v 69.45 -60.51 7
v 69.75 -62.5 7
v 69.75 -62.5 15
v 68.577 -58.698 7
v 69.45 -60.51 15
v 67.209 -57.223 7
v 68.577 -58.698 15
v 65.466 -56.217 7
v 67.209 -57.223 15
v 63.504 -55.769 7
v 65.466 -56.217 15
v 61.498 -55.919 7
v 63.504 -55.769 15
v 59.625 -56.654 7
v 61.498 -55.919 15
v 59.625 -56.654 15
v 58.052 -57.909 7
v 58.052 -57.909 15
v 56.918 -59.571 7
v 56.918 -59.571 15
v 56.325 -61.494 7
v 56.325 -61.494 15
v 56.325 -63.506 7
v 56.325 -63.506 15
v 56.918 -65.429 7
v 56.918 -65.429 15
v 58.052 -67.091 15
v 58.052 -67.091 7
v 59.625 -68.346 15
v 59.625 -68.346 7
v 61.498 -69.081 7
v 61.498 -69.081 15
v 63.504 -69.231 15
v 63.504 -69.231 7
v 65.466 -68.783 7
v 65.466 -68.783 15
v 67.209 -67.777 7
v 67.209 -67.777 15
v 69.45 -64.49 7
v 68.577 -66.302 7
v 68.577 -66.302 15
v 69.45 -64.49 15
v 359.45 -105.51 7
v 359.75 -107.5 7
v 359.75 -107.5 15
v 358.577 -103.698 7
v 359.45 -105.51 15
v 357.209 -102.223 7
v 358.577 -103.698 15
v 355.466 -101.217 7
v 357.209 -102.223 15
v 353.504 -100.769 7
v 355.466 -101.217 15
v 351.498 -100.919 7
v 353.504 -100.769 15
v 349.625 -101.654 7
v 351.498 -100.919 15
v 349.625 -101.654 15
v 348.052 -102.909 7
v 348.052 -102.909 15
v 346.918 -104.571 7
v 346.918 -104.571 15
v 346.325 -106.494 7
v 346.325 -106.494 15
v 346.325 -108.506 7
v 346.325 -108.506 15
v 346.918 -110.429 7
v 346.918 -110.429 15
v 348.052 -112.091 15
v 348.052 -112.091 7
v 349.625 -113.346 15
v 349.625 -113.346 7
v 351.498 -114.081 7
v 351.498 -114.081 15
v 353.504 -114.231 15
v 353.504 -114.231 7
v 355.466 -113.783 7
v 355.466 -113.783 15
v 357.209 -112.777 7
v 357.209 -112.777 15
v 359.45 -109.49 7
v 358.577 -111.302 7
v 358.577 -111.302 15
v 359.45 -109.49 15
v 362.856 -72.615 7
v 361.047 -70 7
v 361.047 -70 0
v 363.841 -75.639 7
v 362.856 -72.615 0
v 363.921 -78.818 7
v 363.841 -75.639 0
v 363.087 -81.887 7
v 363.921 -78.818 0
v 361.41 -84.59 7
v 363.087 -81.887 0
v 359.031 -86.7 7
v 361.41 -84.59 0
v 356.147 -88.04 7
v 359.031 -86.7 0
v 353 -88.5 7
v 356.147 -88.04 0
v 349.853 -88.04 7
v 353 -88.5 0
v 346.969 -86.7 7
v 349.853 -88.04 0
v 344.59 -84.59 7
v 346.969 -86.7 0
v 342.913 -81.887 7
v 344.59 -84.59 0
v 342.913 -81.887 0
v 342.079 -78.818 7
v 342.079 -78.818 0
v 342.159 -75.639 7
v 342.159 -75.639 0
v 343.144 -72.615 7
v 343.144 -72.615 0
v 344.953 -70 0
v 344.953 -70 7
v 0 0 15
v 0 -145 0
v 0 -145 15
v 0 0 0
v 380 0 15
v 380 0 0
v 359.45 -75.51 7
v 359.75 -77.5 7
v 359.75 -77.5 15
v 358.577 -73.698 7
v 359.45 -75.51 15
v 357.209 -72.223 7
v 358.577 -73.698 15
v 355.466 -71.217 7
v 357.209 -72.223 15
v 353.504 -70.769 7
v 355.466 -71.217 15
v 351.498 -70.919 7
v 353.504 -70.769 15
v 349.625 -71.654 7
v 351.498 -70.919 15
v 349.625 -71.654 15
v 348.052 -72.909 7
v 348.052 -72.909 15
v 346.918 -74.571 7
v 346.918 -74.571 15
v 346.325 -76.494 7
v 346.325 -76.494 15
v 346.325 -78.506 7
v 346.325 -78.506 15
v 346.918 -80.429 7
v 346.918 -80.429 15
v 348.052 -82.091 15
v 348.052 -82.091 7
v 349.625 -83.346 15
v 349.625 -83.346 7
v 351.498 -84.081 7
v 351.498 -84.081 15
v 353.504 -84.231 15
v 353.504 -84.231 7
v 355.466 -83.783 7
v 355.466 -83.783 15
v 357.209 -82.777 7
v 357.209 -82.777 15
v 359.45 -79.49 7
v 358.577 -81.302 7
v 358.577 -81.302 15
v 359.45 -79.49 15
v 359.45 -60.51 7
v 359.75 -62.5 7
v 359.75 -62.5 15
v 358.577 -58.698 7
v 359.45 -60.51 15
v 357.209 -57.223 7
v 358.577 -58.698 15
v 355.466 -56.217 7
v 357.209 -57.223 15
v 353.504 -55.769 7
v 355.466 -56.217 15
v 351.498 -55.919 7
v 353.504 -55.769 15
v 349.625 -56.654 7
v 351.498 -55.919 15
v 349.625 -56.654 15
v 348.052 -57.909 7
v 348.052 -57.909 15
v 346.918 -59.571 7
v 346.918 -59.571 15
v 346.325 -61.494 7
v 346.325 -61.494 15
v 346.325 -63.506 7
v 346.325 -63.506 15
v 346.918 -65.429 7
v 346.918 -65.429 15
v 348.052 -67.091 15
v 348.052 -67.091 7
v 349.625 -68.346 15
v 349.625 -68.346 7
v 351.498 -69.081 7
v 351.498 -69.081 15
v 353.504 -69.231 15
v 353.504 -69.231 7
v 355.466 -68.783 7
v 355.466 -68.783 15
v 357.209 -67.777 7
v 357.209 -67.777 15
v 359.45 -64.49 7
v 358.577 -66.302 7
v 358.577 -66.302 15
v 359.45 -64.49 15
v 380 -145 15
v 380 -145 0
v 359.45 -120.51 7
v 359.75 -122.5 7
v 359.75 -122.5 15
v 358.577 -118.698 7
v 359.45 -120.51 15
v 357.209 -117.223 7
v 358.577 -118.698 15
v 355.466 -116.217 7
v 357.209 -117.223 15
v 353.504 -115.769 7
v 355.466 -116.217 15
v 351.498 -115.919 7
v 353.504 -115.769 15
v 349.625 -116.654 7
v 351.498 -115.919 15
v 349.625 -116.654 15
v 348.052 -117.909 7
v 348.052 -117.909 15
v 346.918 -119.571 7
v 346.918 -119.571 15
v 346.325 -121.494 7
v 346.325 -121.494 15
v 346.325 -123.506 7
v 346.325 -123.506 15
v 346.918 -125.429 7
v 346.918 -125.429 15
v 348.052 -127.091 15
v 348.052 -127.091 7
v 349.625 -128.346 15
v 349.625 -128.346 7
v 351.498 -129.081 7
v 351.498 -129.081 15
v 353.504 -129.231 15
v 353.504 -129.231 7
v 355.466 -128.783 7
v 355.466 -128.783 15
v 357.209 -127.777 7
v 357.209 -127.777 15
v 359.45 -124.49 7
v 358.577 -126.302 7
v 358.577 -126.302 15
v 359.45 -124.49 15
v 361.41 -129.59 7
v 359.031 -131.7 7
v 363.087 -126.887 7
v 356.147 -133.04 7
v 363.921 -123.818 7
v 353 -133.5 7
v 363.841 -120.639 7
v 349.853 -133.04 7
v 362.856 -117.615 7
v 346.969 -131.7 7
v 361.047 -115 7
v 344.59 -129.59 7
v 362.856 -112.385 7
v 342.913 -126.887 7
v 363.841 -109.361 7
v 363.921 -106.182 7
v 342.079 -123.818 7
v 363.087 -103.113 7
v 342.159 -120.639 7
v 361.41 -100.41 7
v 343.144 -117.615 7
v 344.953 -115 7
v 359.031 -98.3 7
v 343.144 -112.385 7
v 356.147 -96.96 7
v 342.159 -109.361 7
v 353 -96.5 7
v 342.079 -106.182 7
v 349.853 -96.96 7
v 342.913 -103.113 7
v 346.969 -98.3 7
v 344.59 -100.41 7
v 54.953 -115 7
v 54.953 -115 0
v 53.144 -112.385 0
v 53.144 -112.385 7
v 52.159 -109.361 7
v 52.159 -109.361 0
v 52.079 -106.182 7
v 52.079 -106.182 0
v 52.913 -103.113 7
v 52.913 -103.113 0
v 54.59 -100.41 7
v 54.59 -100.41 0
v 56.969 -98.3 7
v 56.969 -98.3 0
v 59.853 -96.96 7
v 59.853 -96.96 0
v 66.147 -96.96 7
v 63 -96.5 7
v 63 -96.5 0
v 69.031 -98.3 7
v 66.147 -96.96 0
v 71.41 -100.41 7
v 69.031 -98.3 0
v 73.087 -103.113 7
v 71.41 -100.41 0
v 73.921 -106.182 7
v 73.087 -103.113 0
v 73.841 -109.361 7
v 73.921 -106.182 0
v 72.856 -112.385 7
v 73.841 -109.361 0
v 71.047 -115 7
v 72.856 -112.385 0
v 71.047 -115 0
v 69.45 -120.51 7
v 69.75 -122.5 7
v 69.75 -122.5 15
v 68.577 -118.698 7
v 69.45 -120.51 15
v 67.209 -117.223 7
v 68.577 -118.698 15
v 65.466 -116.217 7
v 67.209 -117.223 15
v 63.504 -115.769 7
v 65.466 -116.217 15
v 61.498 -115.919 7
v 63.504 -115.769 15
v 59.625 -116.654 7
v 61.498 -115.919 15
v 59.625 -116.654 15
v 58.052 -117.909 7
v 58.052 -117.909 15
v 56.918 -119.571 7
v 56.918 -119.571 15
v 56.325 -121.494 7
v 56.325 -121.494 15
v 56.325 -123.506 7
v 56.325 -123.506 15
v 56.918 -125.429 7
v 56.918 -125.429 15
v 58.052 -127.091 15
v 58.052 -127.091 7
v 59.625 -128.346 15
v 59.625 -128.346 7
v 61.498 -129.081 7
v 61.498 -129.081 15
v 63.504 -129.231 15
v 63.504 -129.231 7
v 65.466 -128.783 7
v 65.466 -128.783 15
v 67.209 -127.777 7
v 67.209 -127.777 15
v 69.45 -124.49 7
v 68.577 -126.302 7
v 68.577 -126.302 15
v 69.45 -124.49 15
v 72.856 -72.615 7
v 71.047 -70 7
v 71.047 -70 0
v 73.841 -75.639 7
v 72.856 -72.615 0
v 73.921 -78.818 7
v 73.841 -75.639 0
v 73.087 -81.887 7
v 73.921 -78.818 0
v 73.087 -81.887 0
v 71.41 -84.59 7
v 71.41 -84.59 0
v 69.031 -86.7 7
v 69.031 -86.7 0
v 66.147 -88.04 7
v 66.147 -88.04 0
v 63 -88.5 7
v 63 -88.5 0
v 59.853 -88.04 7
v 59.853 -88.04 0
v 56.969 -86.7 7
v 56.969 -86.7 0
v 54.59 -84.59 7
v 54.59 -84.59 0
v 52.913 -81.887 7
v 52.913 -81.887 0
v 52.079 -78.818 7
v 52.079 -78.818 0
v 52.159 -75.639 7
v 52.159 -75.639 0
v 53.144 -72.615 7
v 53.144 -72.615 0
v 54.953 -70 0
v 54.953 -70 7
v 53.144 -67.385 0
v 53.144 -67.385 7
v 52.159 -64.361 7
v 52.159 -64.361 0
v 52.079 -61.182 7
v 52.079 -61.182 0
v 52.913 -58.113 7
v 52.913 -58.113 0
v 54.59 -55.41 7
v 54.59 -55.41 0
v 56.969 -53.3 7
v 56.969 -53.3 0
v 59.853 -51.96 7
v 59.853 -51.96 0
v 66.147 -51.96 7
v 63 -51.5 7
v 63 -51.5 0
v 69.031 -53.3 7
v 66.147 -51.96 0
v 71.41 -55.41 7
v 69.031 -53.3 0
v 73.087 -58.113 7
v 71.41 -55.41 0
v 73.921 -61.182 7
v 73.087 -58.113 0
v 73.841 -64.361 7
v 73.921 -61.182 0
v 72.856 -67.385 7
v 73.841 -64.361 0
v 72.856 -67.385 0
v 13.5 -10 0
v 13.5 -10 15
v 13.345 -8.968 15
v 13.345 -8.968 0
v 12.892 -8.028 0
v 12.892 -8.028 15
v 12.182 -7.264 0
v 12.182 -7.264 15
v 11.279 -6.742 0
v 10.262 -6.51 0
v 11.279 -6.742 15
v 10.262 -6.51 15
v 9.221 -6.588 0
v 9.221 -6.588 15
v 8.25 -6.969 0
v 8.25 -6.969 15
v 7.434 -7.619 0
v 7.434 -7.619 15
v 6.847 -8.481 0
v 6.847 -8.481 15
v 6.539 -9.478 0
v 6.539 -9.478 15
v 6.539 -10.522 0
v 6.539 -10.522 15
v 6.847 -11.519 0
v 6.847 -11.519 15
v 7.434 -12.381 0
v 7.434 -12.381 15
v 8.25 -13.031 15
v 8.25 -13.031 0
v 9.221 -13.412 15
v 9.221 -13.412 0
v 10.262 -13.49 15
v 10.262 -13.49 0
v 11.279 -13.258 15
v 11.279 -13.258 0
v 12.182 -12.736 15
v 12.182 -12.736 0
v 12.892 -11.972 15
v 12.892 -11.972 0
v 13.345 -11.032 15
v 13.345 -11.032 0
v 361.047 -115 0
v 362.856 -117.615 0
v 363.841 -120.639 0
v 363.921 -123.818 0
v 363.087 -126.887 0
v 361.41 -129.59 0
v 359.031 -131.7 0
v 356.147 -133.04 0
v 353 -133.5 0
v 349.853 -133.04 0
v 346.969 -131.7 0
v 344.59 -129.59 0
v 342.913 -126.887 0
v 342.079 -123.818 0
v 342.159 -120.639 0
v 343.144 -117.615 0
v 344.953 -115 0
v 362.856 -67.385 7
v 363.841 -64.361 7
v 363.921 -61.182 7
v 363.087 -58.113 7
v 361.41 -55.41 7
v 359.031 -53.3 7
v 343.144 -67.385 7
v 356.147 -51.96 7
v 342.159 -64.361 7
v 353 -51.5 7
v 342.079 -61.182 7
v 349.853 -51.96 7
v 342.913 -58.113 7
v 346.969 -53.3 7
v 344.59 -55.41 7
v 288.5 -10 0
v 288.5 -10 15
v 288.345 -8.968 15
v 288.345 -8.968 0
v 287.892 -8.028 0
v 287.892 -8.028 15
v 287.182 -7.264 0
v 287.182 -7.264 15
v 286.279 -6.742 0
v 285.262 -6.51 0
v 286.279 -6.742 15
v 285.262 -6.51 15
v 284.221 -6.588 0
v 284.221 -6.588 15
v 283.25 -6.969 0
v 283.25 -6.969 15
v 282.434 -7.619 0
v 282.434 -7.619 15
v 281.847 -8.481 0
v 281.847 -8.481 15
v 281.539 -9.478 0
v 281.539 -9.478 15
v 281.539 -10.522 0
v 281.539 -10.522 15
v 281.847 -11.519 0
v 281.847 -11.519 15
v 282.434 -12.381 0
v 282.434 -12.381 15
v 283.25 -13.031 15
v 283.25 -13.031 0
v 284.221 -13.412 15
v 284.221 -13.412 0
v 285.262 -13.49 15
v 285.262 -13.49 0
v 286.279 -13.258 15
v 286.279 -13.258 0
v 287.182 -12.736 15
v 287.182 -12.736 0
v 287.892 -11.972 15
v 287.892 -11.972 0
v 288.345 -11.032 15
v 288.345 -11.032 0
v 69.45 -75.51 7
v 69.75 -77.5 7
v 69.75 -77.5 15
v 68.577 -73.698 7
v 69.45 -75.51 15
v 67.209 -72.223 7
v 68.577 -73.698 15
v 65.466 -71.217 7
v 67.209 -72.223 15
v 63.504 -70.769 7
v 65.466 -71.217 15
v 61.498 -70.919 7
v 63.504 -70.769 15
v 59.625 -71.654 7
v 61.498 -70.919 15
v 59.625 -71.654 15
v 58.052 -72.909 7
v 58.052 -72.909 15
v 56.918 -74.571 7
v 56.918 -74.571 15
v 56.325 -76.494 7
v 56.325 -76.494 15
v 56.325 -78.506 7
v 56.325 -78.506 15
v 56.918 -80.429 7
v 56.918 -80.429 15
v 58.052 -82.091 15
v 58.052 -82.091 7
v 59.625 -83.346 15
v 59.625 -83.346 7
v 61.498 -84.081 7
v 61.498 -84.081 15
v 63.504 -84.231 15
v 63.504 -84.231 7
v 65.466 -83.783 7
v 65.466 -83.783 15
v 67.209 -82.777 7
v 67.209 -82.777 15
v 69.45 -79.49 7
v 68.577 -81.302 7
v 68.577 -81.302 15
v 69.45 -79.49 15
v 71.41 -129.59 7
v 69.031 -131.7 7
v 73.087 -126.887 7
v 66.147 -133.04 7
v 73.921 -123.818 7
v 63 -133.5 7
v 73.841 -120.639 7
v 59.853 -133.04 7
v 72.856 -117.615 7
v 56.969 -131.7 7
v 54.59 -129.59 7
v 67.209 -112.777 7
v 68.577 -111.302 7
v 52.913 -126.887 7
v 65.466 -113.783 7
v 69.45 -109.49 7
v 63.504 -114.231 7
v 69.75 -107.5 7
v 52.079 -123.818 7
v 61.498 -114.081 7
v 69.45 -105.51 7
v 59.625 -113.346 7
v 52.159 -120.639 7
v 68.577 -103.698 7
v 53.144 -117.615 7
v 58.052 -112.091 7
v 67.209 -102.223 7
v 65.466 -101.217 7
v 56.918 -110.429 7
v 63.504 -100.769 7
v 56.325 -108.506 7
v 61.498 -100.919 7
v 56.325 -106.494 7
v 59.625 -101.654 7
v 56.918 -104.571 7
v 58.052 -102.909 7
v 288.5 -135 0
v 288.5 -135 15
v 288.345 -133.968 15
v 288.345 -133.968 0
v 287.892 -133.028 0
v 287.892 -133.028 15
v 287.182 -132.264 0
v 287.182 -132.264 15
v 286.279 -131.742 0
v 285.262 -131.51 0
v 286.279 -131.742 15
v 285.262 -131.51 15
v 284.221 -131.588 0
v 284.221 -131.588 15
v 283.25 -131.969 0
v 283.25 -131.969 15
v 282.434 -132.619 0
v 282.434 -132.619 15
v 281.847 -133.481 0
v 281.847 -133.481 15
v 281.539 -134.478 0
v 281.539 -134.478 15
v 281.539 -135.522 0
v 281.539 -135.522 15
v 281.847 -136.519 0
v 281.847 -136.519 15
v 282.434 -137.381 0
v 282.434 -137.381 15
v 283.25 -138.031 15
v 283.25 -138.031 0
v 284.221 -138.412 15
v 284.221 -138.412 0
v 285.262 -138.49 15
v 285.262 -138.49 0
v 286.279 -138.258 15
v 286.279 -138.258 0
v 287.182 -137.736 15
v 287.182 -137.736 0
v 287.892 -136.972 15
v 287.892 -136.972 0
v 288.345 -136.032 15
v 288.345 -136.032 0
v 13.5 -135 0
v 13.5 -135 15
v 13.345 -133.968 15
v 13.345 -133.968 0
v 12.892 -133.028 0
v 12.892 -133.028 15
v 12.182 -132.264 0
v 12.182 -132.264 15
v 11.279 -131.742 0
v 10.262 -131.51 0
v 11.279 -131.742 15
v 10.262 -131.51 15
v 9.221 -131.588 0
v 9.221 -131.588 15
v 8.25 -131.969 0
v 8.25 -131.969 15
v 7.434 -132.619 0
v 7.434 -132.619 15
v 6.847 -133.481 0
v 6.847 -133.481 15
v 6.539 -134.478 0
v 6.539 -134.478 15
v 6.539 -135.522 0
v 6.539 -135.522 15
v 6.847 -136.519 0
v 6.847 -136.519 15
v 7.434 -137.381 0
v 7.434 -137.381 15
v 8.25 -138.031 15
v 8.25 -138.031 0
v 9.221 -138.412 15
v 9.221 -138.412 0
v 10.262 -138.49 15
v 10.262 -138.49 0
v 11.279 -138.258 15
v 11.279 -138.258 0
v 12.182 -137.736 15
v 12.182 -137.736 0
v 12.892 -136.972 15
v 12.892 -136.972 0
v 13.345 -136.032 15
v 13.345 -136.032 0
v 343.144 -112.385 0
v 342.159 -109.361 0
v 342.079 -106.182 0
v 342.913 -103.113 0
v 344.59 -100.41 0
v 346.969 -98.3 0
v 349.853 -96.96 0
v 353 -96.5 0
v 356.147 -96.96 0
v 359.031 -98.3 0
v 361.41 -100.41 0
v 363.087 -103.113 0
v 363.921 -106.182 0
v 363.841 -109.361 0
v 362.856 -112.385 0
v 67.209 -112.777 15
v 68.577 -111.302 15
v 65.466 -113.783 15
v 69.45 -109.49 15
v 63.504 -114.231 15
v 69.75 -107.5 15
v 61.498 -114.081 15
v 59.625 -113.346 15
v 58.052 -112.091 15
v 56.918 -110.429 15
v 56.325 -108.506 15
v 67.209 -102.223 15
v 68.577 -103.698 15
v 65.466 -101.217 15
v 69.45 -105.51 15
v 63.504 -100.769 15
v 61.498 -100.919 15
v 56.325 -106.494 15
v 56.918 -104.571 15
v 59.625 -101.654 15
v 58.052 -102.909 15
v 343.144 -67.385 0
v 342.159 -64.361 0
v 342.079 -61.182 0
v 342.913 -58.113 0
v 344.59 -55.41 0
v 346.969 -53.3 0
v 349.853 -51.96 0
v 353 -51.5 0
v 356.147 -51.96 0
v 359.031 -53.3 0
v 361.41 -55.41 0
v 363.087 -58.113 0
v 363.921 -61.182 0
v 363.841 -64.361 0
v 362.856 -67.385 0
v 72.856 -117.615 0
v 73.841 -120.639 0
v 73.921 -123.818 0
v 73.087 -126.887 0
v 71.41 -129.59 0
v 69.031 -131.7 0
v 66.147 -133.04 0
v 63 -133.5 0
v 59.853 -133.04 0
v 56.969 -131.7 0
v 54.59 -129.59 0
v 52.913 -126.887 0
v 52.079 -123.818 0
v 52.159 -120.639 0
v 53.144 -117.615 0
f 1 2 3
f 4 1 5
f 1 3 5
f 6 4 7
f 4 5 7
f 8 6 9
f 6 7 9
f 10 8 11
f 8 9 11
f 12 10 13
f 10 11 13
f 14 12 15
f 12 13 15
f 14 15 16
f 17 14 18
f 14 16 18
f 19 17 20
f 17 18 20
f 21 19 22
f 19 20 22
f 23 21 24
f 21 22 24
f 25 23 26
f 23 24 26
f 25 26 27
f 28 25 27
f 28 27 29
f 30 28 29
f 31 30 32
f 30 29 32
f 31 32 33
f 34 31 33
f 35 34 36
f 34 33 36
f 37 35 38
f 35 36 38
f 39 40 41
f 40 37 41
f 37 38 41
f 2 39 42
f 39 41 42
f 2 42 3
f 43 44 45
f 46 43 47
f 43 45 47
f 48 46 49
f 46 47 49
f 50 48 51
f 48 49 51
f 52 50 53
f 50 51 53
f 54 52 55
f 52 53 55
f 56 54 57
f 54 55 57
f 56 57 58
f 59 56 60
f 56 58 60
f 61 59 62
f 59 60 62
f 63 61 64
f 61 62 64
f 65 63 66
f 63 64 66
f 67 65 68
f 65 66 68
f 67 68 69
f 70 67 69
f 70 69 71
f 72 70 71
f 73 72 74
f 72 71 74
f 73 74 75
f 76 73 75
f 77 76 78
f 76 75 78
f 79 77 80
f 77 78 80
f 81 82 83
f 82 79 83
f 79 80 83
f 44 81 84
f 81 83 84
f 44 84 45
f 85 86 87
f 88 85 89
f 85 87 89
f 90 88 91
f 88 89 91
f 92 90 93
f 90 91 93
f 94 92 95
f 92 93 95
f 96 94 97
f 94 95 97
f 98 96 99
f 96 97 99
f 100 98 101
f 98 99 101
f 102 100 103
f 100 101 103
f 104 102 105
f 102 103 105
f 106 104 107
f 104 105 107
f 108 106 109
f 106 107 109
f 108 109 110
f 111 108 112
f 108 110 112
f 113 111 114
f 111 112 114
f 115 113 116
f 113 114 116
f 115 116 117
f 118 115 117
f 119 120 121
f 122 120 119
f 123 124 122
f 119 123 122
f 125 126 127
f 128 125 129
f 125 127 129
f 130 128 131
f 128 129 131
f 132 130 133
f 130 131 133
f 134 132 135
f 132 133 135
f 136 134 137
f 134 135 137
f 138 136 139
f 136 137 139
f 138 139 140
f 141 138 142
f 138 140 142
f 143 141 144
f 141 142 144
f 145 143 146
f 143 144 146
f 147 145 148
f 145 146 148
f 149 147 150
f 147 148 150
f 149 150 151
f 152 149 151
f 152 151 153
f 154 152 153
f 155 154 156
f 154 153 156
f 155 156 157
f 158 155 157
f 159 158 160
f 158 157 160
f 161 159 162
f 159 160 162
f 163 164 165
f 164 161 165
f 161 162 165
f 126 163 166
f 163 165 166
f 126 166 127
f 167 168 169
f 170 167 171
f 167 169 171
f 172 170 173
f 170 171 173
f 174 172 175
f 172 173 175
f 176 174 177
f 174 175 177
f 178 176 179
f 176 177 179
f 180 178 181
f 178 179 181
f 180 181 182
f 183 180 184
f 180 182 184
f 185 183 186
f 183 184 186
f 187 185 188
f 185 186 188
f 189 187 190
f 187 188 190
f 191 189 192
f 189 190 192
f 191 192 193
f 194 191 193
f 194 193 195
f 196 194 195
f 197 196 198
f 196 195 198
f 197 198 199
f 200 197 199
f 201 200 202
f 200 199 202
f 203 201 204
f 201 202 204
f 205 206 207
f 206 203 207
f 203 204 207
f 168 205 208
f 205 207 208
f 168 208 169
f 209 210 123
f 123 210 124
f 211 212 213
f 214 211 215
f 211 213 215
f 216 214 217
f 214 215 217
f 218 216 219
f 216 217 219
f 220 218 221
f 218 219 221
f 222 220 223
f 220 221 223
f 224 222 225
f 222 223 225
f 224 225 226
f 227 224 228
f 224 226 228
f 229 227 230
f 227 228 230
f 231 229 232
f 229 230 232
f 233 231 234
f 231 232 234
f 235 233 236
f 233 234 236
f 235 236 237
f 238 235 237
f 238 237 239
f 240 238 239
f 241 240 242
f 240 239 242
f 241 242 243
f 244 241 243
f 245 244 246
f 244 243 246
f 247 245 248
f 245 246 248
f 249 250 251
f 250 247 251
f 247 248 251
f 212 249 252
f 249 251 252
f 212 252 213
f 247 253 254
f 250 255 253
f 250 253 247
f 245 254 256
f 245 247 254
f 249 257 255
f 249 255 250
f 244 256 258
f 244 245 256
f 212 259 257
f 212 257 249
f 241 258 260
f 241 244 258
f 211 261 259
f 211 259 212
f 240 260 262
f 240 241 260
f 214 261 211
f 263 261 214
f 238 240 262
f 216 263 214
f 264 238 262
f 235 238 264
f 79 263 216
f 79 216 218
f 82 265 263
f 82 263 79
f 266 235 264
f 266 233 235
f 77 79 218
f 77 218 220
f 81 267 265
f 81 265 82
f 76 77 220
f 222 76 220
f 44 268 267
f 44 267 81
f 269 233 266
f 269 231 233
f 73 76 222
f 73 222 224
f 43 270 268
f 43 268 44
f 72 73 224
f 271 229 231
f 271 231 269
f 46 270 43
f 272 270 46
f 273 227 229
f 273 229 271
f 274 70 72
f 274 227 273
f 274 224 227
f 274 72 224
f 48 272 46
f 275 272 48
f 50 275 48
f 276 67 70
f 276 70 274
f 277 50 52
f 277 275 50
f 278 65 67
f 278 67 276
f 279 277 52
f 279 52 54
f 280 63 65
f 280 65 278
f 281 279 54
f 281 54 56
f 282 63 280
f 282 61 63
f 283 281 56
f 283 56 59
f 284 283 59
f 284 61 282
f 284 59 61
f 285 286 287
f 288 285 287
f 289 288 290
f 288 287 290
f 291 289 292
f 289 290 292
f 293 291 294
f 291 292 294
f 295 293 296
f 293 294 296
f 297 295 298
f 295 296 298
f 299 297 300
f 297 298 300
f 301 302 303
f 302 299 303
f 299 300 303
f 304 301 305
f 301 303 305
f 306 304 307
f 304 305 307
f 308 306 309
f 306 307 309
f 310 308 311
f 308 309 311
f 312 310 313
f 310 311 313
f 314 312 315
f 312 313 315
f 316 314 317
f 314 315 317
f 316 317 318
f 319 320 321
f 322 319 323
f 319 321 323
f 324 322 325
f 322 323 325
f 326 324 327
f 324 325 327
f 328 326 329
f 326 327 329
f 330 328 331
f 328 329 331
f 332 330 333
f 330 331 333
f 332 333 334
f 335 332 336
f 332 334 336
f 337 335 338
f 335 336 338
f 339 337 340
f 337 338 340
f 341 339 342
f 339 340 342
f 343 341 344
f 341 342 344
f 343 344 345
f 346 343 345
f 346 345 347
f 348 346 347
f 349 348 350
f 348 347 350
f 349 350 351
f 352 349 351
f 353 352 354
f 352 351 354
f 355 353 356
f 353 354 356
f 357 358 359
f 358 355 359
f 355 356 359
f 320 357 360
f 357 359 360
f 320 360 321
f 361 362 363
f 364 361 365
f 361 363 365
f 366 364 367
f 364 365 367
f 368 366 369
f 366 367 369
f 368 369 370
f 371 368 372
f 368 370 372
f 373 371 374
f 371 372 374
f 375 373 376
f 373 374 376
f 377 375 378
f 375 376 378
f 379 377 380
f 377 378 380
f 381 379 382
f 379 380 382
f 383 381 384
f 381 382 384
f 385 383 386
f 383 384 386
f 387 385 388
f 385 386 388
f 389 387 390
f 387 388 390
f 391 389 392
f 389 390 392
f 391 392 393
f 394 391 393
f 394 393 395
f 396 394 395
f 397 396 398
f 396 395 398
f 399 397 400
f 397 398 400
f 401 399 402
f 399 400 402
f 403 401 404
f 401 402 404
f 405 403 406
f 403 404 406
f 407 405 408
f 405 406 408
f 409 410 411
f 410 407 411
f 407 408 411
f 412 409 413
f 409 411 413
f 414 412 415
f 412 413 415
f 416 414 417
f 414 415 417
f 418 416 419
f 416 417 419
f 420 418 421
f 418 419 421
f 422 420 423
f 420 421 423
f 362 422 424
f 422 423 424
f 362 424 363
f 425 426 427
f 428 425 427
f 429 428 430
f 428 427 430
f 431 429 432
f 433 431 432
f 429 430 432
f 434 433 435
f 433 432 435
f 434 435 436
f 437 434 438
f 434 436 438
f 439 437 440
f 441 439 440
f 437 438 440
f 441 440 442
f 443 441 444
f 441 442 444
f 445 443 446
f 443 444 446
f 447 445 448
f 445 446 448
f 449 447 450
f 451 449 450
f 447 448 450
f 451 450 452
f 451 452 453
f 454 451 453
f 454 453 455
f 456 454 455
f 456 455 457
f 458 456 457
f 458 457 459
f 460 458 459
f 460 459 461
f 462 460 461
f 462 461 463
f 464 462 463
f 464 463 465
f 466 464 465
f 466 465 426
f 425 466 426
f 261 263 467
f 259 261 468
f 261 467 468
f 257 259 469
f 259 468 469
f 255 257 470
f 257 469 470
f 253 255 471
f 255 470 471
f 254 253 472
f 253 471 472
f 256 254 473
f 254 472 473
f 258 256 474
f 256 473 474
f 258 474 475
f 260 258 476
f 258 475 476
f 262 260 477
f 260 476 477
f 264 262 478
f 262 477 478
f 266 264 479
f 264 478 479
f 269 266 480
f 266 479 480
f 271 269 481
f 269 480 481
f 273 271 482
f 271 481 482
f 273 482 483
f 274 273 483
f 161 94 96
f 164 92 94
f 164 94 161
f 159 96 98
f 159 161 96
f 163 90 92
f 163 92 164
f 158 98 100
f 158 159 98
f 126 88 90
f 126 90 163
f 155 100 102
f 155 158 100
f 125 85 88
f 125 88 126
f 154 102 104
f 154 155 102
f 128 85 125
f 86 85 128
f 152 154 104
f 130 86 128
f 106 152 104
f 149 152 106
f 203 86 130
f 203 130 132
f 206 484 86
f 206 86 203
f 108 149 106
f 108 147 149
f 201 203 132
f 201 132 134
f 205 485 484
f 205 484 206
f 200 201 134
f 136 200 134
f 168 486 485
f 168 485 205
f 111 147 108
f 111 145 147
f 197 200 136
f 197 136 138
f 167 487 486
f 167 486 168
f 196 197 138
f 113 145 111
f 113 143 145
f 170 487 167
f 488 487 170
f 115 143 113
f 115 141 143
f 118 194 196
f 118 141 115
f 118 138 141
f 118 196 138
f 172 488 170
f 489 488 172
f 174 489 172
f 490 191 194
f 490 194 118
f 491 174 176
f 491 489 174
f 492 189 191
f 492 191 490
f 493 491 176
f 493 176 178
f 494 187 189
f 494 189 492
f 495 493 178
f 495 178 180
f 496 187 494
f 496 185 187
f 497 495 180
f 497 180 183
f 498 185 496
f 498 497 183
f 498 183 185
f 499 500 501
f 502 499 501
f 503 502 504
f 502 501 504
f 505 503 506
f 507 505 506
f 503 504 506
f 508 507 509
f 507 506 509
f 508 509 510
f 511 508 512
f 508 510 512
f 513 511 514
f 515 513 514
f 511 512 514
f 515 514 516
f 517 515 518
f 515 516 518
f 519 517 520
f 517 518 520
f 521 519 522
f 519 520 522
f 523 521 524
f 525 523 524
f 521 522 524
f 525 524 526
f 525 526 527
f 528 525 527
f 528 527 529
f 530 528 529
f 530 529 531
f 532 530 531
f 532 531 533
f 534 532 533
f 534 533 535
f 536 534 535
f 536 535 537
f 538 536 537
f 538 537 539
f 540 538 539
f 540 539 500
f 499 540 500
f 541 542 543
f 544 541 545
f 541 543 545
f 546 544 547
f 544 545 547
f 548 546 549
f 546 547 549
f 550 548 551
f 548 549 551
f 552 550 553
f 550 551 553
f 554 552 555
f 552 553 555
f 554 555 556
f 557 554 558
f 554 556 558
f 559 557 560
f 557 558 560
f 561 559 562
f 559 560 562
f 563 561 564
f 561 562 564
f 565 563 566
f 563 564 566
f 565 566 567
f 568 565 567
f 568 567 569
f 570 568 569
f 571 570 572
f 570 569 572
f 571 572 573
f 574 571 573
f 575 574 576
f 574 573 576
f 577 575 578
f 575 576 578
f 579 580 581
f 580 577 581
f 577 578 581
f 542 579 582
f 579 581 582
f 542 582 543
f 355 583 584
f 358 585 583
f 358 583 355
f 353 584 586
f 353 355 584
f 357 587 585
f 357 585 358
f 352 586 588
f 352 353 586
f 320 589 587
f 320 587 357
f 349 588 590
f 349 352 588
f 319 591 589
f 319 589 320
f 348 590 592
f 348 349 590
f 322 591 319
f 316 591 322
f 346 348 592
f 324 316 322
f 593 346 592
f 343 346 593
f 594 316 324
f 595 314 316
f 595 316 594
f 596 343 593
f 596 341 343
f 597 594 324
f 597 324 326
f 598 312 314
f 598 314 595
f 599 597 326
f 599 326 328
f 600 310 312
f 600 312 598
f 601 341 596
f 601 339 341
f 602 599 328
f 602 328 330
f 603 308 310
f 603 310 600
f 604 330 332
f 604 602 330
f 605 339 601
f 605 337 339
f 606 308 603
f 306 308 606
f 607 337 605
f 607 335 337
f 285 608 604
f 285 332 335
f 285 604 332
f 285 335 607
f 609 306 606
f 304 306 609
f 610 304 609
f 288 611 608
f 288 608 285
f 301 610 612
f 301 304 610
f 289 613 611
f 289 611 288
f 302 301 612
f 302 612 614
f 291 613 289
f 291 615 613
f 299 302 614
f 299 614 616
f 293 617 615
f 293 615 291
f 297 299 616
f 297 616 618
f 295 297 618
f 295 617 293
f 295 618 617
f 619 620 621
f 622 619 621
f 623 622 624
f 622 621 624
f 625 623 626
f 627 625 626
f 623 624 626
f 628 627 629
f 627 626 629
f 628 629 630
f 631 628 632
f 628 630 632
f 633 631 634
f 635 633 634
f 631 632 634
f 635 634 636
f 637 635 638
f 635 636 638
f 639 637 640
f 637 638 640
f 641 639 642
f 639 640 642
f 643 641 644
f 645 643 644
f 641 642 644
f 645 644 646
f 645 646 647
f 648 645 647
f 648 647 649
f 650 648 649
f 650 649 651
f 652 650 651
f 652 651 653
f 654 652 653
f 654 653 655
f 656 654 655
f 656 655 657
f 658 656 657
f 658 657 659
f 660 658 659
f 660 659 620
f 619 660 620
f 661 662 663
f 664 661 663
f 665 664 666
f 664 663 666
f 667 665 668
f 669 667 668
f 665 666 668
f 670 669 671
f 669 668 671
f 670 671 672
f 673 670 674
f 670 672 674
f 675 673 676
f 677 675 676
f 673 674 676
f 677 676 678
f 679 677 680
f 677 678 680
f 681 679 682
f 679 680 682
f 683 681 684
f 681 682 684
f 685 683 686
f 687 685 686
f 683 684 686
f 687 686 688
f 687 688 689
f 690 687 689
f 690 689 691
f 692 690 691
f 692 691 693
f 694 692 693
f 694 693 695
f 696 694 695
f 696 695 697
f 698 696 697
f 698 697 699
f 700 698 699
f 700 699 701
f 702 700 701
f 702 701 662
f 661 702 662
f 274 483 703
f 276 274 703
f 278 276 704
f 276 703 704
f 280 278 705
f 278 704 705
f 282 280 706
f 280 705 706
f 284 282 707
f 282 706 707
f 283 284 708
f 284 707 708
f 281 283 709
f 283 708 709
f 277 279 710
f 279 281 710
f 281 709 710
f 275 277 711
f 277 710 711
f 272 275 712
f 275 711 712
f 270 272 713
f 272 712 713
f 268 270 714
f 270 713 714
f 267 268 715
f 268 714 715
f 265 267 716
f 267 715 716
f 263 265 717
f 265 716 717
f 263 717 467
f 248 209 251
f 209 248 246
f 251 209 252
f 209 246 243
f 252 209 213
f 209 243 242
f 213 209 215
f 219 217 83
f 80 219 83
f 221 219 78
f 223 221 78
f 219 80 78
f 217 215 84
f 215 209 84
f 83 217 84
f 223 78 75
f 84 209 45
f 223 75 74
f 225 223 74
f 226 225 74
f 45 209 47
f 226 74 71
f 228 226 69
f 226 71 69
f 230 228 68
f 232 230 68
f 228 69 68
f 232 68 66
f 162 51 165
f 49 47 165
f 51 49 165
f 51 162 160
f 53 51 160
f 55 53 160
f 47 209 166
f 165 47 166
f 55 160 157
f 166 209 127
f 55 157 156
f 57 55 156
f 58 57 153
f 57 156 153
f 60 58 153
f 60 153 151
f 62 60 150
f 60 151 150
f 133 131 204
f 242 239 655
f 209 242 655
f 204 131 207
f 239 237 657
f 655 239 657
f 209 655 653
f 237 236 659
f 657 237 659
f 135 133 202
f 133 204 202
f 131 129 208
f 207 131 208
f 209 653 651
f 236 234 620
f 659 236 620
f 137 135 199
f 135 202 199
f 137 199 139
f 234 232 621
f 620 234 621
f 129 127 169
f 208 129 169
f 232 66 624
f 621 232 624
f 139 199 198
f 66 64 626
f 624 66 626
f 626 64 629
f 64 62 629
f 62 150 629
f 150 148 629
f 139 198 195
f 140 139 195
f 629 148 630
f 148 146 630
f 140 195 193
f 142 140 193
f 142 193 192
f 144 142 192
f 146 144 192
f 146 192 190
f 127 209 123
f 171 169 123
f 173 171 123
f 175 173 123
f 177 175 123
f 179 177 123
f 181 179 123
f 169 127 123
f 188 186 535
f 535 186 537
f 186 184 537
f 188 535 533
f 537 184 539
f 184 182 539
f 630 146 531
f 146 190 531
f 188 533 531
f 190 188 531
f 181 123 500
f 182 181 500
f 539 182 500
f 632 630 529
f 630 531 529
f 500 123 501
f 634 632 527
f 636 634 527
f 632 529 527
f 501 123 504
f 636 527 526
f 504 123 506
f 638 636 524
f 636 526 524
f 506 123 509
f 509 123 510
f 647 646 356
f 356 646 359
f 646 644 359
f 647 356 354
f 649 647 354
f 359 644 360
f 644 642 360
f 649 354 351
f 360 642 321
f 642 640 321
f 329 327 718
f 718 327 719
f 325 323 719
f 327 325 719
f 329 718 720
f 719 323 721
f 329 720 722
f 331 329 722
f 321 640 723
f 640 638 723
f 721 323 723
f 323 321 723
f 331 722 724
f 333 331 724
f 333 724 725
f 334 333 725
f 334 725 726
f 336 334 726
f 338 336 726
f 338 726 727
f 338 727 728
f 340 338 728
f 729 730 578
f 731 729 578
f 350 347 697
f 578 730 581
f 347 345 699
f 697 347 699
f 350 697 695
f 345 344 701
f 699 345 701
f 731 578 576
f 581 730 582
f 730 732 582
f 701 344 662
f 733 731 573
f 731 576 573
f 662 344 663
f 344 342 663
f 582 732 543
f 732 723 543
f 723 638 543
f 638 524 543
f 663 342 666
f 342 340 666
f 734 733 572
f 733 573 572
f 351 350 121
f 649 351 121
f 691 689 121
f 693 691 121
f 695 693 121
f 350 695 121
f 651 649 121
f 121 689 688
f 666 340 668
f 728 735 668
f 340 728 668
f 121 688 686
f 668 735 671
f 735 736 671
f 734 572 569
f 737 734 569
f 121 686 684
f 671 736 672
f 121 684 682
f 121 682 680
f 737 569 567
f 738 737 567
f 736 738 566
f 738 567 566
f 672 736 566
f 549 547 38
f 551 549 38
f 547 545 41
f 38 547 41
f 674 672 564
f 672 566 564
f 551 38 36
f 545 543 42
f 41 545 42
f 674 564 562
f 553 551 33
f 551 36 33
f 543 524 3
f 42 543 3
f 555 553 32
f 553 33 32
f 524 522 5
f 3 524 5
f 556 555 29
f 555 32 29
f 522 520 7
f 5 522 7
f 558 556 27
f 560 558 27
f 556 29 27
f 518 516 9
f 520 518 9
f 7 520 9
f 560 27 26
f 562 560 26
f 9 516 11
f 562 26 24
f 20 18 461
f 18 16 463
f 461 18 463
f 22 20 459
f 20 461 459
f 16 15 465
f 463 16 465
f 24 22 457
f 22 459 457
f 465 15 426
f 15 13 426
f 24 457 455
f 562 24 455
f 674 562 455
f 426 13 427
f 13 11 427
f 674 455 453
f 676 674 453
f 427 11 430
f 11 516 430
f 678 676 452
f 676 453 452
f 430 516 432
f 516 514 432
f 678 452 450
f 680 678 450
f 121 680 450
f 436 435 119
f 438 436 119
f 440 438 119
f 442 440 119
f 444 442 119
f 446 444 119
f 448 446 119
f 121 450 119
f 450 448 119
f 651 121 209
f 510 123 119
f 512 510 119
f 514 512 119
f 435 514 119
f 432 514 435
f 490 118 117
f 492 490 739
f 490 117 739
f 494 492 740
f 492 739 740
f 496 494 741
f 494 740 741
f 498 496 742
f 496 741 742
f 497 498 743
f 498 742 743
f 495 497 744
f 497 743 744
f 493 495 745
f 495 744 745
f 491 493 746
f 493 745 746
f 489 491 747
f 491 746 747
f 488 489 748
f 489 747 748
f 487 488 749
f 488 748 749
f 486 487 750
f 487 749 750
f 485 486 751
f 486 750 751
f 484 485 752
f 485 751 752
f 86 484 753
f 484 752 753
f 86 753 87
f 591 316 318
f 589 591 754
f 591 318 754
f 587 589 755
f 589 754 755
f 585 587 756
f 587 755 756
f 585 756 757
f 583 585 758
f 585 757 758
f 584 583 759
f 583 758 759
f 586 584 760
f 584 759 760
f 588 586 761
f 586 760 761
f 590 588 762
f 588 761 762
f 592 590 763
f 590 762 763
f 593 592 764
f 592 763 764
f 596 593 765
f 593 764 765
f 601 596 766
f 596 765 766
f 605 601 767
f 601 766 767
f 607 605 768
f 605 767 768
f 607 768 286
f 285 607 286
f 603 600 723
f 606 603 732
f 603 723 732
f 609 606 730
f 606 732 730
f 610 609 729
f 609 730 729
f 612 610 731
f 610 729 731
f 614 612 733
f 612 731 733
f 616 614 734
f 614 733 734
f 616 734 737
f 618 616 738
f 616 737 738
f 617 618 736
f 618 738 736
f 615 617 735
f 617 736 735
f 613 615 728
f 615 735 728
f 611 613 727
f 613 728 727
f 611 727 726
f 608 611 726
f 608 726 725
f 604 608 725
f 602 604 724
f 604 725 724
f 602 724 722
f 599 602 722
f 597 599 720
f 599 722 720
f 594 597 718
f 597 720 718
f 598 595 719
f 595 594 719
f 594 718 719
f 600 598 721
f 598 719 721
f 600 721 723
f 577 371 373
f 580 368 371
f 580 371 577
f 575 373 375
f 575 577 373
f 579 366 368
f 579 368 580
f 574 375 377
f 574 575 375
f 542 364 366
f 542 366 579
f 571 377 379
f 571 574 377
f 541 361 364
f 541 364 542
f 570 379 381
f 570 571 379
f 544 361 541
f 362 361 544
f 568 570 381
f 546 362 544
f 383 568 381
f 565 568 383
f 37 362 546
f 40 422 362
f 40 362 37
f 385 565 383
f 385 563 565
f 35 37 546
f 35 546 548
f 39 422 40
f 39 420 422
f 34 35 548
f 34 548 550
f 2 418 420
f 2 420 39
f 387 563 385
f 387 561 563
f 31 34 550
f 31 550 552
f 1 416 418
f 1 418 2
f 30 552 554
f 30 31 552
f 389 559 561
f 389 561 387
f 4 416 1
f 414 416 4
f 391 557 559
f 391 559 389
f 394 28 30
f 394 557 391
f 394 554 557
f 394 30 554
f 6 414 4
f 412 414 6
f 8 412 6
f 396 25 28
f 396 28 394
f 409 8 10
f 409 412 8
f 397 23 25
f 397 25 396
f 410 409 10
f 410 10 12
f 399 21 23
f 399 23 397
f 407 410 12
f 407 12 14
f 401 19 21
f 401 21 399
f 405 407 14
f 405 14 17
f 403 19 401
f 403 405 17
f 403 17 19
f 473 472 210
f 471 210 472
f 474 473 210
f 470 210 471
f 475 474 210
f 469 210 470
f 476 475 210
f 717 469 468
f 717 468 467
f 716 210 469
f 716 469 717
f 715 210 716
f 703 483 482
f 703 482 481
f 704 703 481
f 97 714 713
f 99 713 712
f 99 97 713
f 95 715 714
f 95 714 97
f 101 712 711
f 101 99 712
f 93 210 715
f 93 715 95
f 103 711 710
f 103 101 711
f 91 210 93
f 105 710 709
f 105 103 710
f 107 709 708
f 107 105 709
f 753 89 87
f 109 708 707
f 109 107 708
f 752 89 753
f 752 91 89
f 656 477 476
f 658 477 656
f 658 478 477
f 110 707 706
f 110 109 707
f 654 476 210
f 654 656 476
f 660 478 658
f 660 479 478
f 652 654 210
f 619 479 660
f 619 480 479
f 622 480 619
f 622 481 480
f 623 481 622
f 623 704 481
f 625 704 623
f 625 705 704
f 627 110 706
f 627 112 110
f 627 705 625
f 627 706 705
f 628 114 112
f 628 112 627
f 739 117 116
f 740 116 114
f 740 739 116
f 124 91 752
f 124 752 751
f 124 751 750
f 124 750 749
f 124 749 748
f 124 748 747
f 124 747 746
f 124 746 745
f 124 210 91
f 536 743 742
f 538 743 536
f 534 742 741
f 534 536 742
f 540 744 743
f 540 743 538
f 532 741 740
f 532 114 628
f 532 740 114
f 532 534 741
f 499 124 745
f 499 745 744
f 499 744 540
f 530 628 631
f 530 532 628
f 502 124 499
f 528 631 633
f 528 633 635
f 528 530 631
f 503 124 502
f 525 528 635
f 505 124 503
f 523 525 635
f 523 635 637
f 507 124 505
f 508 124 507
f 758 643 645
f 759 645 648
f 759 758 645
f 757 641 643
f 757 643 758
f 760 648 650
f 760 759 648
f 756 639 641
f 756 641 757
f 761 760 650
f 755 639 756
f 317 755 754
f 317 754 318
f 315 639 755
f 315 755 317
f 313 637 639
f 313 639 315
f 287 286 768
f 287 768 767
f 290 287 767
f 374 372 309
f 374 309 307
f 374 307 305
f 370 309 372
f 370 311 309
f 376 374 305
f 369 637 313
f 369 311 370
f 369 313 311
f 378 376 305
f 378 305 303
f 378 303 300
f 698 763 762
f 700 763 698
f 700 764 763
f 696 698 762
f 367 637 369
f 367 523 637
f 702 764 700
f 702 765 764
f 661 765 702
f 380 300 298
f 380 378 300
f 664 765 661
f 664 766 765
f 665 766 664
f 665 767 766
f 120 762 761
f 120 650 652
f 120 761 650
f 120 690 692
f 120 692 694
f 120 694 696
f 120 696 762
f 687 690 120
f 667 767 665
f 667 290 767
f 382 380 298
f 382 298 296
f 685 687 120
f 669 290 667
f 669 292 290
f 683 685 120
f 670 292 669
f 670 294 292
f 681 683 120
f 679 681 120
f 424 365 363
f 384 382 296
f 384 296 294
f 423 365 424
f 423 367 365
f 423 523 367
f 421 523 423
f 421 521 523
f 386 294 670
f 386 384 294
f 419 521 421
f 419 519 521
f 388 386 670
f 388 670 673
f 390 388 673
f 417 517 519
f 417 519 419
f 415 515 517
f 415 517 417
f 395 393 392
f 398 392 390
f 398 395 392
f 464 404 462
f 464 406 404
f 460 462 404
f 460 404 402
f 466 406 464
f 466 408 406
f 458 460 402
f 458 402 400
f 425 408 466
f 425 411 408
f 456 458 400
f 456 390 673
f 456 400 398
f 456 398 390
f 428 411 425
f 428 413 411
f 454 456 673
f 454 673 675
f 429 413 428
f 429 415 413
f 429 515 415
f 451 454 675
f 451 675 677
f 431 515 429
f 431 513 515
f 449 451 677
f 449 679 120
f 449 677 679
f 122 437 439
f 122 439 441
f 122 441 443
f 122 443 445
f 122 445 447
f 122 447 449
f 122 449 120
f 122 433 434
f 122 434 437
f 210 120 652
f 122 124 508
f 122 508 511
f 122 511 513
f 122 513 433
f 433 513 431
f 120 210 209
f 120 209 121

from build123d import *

# Parameters (mm, degrees)
SKIZZE1_W                                            = 380
SKIZZE1_H                                            = 145
AUFSATZ_LINEAR_AUSTRAGEN1_DEPTH                      = 15
F_7_0_7_DURCHMESSER_BOHRUNG1_D                       = 7
STIRNSENKUNG_F_R_M12_SECHSKANTSCHRAUBE_M_D           = 13.5
STIRNSENKUNG_F_R_M12_SECHSKANTSCHRAUBE_M_CBORE_D     = 22
STIRNSENKUNG_F_R_M12_SECHSKANTSCHRAUBE_M_CBORE_DEPTH = 7
LINEARES_MUSTER1_COUNT                               = 2
LINEARES_MUSTER1_PITCH                               = 15


with BuildPart() as part:
    # Skizze1 → Aufsatz-Linear austragen1 (new body)
    with BuildSketch(Plane(origin=(0, 0, 0), x_dir=(-1, 0, 0), z_dir=(0, 0, -1))):
        with Locations((-190, -72.5)):
            Rectangle(SKIZZE1_W, SKIZZE1_H)
    extrude(amount=-AUFSATZ_LINEAR_AUSTRAGEN1_DEPTH)

    # Ø7.0 (7) Durchmesser Bohrung1 (through all)
    with Locations(Plane(origin=(0, 0, 0), x_dir=(-1, 0, 0), z_dir=(0, 0, -1))):
        with Locations((-10, -135), (-10, -10), (-285, -10), (-285, -135)):
            Hole(F_7_0_7_DURCHMESSER_BOHRUNG1_D / 2)

    # Stirnsenkung für M12 Sechskantschraube mit Schaft1 (through all)
    with Locations(Plane(origin=(0, 0, 0), x_dir=(-1, 0, 0), z_dir=(0, 0, -1))):
        with Locations((-63, -62.5), (-63, -107.5), (-353, -107.5), (-353, -62.5)):
            stirnsenkung_f_r_m12_sechskantschraube_m = CounterBoreHole(STIRNSENKUNG_F_R_M12_SECHSKANTSCHRAUBE_M_D / 2, STIRNSENKUNG_F_R_M12_SECHSKANTSCHRAUBE_M_CBORE_D / 2, STIRNSENKUNG_F_R_M12_SECHSKANTSCHRAUBE_M_CBORE_DEPTH)

    # Lineares Muster1: Stirnsenkung für M12 Sechskantschraube mit Schaft1 ×2
    with Locations(*[(0, -i * LINEARES_MUSTER1_PITCH, 0) for i in range(1, LINEARES_MUSTER1_COUNT)]):
        add(stirnsenkung_f_r_m12_sechskantschraube_m, mode=Mode.SUBTRACT)


solid = part.part
